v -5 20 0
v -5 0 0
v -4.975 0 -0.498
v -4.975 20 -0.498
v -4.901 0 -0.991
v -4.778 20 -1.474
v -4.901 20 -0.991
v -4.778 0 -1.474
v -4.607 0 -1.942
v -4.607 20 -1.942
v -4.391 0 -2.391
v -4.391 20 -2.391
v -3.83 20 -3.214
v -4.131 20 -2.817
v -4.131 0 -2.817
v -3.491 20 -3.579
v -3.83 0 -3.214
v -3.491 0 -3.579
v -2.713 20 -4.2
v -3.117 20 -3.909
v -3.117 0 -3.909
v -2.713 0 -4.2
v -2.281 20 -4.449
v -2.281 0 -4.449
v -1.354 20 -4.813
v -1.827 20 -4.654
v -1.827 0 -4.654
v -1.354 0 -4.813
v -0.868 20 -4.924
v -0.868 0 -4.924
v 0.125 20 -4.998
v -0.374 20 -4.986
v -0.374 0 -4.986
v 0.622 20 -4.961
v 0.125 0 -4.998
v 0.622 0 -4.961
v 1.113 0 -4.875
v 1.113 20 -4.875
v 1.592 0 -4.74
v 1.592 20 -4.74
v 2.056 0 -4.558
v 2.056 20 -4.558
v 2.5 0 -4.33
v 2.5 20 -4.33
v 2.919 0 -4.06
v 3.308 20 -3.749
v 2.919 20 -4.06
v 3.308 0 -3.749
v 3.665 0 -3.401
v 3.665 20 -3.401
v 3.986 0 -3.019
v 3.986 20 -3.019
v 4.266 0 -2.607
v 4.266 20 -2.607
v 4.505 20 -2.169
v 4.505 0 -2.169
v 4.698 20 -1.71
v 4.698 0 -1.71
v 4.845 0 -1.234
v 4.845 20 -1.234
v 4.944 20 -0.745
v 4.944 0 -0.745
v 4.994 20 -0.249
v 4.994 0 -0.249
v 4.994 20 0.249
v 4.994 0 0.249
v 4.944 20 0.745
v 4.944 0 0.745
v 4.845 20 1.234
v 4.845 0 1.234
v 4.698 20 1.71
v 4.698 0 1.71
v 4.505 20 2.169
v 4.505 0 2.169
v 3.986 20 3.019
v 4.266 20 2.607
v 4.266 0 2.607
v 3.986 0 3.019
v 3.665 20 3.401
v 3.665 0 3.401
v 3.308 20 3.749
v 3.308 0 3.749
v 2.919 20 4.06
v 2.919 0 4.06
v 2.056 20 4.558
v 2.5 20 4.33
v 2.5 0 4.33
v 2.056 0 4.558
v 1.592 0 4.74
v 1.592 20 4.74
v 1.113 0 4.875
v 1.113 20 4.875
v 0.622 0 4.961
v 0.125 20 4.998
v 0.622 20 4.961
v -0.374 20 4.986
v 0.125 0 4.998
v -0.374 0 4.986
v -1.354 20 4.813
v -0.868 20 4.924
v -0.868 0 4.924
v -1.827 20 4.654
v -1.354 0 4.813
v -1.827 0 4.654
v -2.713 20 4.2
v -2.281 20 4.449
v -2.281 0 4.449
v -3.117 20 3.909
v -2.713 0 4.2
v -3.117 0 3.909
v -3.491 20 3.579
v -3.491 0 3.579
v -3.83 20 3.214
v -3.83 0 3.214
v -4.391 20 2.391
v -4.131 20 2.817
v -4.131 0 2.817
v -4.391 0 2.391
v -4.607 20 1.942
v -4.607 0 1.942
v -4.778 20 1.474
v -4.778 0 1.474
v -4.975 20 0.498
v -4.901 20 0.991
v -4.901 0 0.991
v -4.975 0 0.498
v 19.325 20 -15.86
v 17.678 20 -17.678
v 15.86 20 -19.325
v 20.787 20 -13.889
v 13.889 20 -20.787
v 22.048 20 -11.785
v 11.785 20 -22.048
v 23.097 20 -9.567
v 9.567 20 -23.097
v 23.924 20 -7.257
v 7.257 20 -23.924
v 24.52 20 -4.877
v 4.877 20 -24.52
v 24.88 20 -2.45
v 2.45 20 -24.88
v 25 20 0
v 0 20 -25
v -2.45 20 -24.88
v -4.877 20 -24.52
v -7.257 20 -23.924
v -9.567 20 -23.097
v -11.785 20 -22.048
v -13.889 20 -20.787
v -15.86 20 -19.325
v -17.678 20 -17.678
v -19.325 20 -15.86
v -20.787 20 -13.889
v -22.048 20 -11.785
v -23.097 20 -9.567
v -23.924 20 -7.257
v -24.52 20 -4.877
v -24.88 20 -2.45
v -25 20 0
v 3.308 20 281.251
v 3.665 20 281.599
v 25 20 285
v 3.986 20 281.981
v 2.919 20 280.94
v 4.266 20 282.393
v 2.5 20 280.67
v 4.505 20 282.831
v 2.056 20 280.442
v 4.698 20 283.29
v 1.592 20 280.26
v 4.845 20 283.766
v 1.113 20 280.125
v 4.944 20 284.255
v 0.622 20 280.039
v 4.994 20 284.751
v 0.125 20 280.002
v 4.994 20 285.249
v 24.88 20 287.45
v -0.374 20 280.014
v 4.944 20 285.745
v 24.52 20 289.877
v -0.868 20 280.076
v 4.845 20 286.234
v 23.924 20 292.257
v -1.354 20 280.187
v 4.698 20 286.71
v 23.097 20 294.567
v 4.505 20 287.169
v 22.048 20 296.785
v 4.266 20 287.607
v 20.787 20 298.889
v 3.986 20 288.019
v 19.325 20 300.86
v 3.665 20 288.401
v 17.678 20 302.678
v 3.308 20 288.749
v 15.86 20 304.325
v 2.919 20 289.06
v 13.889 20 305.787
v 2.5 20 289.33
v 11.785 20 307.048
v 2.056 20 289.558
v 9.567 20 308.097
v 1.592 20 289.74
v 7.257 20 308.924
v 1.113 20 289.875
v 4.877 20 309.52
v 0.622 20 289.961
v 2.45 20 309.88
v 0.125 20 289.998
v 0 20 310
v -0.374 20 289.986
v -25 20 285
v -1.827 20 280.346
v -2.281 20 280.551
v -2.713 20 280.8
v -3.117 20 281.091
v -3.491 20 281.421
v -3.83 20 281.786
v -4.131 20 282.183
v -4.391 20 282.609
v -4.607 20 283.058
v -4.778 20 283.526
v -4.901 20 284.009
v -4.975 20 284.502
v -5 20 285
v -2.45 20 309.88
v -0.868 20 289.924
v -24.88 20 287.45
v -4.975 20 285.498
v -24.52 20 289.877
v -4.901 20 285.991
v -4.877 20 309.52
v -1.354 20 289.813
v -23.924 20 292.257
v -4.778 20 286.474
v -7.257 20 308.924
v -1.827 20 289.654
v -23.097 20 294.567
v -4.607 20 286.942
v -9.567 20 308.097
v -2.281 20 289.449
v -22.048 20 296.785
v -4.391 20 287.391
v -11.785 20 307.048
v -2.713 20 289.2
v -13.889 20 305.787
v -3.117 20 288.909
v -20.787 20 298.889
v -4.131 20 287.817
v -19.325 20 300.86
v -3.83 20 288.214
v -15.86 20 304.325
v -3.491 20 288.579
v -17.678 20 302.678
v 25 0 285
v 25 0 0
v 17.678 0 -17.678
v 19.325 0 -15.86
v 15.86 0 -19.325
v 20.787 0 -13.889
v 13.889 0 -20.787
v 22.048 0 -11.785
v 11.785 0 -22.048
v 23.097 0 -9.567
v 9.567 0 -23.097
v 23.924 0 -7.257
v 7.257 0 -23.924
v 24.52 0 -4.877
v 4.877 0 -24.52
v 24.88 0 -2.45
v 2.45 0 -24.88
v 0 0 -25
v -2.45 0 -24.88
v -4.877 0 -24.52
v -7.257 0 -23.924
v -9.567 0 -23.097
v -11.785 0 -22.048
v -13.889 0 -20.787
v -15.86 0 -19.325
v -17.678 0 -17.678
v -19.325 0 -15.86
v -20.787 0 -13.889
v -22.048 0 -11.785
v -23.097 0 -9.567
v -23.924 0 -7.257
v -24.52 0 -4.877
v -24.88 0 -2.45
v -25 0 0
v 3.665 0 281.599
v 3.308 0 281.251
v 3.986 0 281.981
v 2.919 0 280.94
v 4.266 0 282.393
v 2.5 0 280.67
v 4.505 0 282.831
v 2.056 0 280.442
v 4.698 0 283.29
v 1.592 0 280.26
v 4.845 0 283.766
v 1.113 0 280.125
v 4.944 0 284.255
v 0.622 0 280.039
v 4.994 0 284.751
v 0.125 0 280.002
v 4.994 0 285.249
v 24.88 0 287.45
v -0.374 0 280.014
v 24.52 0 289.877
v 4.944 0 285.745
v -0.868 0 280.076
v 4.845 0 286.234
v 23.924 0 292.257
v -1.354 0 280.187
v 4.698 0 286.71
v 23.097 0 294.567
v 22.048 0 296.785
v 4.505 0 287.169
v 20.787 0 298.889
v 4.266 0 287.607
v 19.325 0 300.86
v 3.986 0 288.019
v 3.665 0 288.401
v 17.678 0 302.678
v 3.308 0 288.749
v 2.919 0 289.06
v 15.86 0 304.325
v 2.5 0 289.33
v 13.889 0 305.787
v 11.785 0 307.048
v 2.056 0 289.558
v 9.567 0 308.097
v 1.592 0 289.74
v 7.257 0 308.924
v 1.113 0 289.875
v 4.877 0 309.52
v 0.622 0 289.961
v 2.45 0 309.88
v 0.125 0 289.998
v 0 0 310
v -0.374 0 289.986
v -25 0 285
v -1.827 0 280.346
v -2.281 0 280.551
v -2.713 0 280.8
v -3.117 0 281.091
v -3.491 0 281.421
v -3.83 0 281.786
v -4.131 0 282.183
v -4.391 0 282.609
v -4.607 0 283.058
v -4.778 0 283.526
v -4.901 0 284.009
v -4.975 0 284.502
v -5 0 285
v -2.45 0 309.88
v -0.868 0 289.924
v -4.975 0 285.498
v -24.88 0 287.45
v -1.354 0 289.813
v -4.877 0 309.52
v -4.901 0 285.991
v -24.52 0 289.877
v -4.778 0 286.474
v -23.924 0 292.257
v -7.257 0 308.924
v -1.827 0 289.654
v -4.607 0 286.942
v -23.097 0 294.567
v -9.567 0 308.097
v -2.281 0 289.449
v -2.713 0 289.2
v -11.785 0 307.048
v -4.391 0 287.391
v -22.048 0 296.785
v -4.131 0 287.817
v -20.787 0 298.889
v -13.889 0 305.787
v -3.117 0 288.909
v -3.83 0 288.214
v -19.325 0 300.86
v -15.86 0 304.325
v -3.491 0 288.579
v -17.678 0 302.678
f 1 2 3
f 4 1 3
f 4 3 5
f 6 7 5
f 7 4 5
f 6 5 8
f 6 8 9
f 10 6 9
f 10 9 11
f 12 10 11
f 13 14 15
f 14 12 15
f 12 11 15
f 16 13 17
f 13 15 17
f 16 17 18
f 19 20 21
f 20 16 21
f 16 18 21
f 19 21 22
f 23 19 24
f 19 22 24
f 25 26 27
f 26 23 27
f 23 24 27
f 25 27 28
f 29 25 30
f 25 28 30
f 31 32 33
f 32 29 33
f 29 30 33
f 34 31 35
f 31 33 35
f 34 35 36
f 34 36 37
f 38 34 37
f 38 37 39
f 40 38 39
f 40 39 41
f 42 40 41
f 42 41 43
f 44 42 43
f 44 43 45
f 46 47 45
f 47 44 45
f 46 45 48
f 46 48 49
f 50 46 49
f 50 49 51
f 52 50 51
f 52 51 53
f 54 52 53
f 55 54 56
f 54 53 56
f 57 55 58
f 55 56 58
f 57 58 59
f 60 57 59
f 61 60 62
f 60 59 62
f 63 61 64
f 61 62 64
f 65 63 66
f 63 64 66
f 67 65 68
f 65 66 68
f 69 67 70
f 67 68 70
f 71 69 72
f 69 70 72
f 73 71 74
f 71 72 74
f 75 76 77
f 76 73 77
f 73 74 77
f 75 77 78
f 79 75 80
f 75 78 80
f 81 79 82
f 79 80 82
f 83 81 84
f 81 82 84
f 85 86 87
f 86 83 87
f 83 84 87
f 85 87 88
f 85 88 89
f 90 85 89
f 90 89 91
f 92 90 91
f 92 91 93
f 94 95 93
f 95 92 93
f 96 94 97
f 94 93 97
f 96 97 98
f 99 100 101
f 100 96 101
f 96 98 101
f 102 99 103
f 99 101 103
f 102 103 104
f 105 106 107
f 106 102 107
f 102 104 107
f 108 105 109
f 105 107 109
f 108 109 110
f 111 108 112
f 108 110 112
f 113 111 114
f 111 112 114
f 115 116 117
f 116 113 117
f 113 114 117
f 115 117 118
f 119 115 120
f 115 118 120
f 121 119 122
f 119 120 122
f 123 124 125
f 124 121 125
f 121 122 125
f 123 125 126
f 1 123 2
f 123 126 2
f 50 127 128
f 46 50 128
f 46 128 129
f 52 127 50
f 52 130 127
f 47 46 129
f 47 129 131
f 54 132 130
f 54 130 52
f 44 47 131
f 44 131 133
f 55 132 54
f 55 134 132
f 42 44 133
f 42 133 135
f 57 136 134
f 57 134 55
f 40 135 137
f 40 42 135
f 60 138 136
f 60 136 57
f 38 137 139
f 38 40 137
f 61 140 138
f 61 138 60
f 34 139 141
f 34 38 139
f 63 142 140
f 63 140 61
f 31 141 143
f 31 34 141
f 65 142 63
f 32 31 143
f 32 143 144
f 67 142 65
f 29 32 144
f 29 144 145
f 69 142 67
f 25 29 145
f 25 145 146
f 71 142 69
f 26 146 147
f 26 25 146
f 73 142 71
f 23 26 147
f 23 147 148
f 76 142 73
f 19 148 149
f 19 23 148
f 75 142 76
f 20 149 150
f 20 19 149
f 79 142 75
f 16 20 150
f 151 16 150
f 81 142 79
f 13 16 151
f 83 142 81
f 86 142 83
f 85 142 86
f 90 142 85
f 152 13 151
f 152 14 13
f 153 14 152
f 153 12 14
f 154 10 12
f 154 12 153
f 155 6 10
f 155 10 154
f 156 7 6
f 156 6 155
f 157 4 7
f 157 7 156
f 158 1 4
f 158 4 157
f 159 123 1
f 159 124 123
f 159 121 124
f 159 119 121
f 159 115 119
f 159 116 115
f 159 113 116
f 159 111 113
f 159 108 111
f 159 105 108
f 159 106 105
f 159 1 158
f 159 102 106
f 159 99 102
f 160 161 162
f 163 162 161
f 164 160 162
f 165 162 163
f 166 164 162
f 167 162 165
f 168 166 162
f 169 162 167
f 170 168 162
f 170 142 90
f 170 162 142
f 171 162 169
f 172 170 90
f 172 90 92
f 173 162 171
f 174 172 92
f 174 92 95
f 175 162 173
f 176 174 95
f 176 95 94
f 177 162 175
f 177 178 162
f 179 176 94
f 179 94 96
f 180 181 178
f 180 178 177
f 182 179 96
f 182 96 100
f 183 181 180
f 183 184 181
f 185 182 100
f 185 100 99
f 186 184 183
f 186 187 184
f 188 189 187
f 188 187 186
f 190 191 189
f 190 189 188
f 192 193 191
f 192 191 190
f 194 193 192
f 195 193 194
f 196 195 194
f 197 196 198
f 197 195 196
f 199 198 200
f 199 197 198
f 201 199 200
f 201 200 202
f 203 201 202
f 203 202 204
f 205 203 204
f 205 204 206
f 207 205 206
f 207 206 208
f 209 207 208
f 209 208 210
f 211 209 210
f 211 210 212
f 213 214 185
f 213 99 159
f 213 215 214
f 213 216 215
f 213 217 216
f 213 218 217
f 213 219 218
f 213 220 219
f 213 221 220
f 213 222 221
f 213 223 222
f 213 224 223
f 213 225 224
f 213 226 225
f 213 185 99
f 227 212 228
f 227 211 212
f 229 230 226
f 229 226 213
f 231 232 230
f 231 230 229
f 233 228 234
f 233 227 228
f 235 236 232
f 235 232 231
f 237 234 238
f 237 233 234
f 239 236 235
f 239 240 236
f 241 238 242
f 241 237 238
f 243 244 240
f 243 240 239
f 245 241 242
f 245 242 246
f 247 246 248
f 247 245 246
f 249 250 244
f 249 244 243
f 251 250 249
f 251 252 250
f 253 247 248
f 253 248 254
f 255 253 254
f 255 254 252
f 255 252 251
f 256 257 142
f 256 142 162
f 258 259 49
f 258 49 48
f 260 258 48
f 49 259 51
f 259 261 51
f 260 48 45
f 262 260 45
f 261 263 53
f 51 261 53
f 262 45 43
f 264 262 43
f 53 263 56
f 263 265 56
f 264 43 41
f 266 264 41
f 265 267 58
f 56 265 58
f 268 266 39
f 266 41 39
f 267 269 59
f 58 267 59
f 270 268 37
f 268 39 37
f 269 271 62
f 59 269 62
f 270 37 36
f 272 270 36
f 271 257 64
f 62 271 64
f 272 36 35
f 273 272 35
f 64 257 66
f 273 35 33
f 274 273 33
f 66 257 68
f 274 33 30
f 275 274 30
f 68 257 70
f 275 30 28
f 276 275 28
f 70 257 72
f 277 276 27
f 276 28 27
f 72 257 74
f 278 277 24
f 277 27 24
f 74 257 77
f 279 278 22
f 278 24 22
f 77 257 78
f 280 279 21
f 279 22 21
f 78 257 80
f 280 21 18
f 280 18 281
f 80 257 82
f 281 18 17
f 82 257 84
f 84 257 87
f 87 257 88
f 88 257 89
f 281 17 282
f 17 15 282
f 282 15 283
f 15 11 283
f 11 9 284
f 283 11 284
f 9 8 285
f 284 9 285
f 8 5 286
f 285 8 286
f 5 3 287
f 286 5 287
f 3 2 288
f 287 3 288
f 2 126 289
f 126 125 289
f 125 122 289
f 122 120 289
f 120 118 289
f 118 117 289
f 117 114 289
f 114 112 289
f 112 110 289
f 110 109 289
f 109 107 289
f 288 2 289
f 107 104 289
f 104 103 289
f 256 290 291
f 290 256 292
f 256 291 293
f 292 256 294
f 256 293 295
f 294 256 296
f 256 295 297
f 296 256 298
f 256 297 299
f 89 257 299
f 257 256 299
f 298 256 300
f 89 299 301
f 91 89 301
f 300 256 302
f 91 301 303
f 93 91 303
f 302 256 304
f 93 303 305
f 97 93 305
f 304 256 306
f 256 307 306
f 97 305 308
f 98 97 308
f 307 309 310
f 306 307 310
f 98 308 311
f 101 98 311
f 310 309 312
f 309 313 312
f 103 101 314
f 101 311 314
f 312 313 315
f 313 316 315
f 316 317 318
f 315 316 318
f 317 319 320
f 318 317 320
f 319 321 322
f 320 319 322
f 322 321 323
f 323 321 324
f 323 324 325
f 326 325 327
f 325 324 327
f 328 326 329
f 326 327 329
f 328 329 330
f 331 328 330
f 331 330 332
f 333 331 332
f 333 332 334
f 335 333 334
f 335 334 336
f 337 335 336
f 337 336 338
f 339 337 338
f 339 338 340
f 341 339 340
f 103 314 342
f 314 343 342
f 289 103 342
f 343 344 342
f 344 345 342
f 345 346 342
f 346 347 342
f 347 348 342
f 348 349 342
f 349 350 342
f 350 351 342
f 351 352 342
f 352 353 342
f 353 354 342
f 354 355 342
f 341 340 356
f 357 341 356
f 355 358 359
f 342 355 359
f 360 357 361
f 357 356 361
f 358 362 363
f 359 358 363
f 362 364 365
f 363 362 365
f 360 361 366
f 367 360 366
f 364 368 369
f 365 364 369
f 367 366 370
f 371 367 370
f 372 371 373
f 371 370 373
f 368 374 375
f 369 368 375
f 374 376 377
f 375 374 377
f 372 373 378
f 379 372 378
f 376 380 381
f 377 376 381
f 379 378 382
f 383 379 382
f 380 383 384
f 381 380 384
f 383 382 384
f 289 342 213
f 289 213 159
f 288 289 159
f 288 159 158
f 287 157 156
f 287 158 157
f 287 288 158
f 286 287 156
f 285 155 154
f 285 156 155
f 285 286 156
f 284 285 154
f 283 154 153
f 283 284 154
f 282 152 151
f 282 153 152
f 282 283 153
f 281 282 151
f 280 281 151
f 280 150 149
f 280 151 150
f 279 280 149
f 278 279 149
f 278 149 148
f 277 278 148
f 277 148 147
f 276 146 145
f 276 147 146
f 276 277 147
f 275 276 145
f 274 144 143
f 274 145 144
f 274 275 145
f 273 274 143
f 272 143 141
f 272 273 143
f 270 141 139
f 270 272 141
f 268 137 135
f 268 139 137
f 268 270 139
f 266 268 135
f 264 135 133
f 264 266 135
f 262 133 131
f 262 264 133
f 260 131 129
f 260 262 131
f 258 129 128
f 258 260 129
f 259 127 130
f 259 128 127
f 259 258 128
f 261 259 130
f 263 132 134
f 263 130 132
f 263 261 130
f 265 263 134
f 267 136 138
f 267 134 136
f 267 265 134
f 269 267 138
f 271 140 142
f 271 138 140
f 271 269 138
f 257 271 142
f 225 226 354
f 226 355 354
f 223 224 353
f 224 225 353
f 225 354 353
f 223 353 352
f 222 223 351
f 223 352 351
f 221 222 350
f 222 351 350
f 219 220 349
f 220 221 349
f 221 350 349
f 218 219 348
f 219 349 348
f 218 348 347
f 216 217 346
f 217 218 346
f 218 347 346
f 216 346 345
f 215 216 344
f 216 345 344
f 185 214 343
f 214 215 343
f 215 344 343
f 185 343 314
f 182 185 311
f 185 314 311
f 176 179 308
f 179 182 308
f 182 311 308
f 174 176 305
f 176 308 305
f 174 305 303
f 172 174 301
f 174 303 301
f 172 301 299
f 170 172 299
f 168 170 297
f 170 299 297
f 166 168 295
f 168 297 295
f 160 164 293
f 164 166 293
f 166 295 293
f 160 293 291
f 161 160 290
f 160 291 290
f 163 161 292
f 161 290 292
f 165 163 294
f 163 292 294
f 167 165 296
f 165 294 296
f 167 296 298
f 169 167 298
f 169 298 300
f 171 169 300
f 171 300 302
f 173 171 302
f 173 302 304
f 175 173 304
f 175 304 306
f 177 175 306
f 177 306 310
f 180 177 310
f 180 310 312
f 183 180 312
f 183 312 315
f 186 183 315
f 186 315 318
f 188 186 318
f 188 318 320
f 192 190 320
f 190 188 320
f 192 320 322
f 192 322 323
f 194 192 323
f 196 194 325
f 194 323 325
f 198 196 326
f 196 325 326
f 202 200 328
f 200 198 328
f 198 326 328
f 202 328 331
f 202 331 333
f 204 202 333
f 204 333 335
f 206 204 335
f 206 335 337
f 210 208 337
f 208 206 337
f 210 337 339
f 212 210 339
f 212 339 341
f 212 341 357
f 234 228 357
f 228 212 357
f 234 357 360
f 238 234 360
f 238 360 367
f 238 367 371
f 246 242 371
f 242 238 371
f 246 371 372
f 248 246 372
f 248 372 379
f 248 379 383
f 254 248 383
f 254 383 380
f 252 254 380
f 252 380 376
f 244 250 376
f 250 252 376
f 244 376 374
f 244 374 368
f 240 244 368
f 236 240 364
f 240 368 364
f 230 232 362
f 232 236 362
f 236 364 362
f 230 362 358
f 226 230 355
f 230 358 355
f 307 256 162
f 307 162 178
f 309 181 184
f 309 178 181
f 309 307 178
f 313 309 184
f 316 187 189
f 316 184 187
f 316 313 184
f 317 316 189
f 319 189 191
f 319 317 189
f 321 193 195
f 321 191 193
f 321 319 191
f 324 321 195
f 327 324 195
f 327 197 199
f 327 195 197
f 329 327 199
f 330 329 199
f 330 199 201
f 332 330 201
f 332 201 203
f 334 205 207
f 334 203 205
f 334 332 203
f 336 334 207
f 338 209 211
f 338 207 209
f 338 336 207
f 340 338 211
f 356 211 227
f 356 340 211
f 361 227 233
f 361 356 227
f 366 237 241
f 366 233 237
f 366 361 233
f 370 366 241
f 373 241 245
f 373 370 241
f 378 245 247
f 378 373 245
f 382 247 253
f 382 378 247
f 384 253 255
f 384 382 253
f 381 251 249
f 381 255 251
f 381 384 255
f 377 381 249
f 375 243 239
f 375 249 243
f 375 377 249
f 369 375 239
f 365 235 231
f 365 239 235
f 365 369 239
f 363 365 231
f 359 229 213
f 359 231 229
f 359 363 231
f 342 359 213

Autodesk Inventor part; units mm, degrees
ref_plane "YZ Plane" through (0, 0, 0) normal (1, 0, 0) x (0, 1, 0)
ref_plane "XZ Plane" through (0, 0, 0) normal (0, 1, 0) x (-1, 0, 0)
ref_plane "XY Plane" through (0, 0, 0) normal (0, 0, 1) x (1, 0, 0)
sketch "Block1" plane through (0, 0, 0) normal (0, 0, 1) x (1, 0, 0)
  line L0 (-25.22, -285) -> (-25.22, 0)
  arc A0 (25.22, 0) -> (-25.22, 0) centre (0, 0) ccw
  line L1 (25.22, 0) -> (25.22, -285)
  arc A1 (-25.22, -285) -> (25.22, -285) centre (0, -285) ccw
  circle A2 centre (0, -285) radius 5.22
  circle A3 centre (0, 0) radius 5.22
  point P0 (0, -142.5)
sketch "Sketch1" plane through (0, 0, 0) normal (0, 1, 0) x (-1, 0, 0)
  arc A0 (-25, 0) -> (25, 0) centre (0, 0) ccw
  arc A1 (25, 285) -> (-25, 285) centre (0, 285) ccw
  line L0 (25, 285) -> (25, 0)
  line L1 (-25, 0) -> (-25, 285)
  circle A2 centre (0, 285) radius 5
  circle A3 centre (0, 0) radius 5
  dimension "d0" = 50
  dimension "d1" = 50
  dimension "d2" = 10
  dimension "d3" = 10
  dimension "d6" = 285
extrude "Extrusion1" add sketch "Sketch1" along normal blind 20
sketch "Sketch2" plane through (0, 20, 0) normal (0, 1, 0) x (1, 0, 0)
  line L0 (25, -285) -> (25, 0) projected
  line L1 (-25, 0) -> (-25, -285) projected
  arc A0 (-25, -285) -> (25, -285) centre (0, -285) ccw projected
  arc A1 (25, 0) -> (-25, 0) centre (0, 0) ccw projected
  circle A2 centre (0, 0) radius 5 projected
  circle A3 centre (0, -285) radius 5 projected
sketch "DXF" plane through (0, 0, 0) normal (0, 1, 0) x (-1, 0, 0)
  point P0 (0, 0)
equation "\"d6\" = 0.95 * pD"
equation "\"pD\" = 300"
properties part number "drivelever"
